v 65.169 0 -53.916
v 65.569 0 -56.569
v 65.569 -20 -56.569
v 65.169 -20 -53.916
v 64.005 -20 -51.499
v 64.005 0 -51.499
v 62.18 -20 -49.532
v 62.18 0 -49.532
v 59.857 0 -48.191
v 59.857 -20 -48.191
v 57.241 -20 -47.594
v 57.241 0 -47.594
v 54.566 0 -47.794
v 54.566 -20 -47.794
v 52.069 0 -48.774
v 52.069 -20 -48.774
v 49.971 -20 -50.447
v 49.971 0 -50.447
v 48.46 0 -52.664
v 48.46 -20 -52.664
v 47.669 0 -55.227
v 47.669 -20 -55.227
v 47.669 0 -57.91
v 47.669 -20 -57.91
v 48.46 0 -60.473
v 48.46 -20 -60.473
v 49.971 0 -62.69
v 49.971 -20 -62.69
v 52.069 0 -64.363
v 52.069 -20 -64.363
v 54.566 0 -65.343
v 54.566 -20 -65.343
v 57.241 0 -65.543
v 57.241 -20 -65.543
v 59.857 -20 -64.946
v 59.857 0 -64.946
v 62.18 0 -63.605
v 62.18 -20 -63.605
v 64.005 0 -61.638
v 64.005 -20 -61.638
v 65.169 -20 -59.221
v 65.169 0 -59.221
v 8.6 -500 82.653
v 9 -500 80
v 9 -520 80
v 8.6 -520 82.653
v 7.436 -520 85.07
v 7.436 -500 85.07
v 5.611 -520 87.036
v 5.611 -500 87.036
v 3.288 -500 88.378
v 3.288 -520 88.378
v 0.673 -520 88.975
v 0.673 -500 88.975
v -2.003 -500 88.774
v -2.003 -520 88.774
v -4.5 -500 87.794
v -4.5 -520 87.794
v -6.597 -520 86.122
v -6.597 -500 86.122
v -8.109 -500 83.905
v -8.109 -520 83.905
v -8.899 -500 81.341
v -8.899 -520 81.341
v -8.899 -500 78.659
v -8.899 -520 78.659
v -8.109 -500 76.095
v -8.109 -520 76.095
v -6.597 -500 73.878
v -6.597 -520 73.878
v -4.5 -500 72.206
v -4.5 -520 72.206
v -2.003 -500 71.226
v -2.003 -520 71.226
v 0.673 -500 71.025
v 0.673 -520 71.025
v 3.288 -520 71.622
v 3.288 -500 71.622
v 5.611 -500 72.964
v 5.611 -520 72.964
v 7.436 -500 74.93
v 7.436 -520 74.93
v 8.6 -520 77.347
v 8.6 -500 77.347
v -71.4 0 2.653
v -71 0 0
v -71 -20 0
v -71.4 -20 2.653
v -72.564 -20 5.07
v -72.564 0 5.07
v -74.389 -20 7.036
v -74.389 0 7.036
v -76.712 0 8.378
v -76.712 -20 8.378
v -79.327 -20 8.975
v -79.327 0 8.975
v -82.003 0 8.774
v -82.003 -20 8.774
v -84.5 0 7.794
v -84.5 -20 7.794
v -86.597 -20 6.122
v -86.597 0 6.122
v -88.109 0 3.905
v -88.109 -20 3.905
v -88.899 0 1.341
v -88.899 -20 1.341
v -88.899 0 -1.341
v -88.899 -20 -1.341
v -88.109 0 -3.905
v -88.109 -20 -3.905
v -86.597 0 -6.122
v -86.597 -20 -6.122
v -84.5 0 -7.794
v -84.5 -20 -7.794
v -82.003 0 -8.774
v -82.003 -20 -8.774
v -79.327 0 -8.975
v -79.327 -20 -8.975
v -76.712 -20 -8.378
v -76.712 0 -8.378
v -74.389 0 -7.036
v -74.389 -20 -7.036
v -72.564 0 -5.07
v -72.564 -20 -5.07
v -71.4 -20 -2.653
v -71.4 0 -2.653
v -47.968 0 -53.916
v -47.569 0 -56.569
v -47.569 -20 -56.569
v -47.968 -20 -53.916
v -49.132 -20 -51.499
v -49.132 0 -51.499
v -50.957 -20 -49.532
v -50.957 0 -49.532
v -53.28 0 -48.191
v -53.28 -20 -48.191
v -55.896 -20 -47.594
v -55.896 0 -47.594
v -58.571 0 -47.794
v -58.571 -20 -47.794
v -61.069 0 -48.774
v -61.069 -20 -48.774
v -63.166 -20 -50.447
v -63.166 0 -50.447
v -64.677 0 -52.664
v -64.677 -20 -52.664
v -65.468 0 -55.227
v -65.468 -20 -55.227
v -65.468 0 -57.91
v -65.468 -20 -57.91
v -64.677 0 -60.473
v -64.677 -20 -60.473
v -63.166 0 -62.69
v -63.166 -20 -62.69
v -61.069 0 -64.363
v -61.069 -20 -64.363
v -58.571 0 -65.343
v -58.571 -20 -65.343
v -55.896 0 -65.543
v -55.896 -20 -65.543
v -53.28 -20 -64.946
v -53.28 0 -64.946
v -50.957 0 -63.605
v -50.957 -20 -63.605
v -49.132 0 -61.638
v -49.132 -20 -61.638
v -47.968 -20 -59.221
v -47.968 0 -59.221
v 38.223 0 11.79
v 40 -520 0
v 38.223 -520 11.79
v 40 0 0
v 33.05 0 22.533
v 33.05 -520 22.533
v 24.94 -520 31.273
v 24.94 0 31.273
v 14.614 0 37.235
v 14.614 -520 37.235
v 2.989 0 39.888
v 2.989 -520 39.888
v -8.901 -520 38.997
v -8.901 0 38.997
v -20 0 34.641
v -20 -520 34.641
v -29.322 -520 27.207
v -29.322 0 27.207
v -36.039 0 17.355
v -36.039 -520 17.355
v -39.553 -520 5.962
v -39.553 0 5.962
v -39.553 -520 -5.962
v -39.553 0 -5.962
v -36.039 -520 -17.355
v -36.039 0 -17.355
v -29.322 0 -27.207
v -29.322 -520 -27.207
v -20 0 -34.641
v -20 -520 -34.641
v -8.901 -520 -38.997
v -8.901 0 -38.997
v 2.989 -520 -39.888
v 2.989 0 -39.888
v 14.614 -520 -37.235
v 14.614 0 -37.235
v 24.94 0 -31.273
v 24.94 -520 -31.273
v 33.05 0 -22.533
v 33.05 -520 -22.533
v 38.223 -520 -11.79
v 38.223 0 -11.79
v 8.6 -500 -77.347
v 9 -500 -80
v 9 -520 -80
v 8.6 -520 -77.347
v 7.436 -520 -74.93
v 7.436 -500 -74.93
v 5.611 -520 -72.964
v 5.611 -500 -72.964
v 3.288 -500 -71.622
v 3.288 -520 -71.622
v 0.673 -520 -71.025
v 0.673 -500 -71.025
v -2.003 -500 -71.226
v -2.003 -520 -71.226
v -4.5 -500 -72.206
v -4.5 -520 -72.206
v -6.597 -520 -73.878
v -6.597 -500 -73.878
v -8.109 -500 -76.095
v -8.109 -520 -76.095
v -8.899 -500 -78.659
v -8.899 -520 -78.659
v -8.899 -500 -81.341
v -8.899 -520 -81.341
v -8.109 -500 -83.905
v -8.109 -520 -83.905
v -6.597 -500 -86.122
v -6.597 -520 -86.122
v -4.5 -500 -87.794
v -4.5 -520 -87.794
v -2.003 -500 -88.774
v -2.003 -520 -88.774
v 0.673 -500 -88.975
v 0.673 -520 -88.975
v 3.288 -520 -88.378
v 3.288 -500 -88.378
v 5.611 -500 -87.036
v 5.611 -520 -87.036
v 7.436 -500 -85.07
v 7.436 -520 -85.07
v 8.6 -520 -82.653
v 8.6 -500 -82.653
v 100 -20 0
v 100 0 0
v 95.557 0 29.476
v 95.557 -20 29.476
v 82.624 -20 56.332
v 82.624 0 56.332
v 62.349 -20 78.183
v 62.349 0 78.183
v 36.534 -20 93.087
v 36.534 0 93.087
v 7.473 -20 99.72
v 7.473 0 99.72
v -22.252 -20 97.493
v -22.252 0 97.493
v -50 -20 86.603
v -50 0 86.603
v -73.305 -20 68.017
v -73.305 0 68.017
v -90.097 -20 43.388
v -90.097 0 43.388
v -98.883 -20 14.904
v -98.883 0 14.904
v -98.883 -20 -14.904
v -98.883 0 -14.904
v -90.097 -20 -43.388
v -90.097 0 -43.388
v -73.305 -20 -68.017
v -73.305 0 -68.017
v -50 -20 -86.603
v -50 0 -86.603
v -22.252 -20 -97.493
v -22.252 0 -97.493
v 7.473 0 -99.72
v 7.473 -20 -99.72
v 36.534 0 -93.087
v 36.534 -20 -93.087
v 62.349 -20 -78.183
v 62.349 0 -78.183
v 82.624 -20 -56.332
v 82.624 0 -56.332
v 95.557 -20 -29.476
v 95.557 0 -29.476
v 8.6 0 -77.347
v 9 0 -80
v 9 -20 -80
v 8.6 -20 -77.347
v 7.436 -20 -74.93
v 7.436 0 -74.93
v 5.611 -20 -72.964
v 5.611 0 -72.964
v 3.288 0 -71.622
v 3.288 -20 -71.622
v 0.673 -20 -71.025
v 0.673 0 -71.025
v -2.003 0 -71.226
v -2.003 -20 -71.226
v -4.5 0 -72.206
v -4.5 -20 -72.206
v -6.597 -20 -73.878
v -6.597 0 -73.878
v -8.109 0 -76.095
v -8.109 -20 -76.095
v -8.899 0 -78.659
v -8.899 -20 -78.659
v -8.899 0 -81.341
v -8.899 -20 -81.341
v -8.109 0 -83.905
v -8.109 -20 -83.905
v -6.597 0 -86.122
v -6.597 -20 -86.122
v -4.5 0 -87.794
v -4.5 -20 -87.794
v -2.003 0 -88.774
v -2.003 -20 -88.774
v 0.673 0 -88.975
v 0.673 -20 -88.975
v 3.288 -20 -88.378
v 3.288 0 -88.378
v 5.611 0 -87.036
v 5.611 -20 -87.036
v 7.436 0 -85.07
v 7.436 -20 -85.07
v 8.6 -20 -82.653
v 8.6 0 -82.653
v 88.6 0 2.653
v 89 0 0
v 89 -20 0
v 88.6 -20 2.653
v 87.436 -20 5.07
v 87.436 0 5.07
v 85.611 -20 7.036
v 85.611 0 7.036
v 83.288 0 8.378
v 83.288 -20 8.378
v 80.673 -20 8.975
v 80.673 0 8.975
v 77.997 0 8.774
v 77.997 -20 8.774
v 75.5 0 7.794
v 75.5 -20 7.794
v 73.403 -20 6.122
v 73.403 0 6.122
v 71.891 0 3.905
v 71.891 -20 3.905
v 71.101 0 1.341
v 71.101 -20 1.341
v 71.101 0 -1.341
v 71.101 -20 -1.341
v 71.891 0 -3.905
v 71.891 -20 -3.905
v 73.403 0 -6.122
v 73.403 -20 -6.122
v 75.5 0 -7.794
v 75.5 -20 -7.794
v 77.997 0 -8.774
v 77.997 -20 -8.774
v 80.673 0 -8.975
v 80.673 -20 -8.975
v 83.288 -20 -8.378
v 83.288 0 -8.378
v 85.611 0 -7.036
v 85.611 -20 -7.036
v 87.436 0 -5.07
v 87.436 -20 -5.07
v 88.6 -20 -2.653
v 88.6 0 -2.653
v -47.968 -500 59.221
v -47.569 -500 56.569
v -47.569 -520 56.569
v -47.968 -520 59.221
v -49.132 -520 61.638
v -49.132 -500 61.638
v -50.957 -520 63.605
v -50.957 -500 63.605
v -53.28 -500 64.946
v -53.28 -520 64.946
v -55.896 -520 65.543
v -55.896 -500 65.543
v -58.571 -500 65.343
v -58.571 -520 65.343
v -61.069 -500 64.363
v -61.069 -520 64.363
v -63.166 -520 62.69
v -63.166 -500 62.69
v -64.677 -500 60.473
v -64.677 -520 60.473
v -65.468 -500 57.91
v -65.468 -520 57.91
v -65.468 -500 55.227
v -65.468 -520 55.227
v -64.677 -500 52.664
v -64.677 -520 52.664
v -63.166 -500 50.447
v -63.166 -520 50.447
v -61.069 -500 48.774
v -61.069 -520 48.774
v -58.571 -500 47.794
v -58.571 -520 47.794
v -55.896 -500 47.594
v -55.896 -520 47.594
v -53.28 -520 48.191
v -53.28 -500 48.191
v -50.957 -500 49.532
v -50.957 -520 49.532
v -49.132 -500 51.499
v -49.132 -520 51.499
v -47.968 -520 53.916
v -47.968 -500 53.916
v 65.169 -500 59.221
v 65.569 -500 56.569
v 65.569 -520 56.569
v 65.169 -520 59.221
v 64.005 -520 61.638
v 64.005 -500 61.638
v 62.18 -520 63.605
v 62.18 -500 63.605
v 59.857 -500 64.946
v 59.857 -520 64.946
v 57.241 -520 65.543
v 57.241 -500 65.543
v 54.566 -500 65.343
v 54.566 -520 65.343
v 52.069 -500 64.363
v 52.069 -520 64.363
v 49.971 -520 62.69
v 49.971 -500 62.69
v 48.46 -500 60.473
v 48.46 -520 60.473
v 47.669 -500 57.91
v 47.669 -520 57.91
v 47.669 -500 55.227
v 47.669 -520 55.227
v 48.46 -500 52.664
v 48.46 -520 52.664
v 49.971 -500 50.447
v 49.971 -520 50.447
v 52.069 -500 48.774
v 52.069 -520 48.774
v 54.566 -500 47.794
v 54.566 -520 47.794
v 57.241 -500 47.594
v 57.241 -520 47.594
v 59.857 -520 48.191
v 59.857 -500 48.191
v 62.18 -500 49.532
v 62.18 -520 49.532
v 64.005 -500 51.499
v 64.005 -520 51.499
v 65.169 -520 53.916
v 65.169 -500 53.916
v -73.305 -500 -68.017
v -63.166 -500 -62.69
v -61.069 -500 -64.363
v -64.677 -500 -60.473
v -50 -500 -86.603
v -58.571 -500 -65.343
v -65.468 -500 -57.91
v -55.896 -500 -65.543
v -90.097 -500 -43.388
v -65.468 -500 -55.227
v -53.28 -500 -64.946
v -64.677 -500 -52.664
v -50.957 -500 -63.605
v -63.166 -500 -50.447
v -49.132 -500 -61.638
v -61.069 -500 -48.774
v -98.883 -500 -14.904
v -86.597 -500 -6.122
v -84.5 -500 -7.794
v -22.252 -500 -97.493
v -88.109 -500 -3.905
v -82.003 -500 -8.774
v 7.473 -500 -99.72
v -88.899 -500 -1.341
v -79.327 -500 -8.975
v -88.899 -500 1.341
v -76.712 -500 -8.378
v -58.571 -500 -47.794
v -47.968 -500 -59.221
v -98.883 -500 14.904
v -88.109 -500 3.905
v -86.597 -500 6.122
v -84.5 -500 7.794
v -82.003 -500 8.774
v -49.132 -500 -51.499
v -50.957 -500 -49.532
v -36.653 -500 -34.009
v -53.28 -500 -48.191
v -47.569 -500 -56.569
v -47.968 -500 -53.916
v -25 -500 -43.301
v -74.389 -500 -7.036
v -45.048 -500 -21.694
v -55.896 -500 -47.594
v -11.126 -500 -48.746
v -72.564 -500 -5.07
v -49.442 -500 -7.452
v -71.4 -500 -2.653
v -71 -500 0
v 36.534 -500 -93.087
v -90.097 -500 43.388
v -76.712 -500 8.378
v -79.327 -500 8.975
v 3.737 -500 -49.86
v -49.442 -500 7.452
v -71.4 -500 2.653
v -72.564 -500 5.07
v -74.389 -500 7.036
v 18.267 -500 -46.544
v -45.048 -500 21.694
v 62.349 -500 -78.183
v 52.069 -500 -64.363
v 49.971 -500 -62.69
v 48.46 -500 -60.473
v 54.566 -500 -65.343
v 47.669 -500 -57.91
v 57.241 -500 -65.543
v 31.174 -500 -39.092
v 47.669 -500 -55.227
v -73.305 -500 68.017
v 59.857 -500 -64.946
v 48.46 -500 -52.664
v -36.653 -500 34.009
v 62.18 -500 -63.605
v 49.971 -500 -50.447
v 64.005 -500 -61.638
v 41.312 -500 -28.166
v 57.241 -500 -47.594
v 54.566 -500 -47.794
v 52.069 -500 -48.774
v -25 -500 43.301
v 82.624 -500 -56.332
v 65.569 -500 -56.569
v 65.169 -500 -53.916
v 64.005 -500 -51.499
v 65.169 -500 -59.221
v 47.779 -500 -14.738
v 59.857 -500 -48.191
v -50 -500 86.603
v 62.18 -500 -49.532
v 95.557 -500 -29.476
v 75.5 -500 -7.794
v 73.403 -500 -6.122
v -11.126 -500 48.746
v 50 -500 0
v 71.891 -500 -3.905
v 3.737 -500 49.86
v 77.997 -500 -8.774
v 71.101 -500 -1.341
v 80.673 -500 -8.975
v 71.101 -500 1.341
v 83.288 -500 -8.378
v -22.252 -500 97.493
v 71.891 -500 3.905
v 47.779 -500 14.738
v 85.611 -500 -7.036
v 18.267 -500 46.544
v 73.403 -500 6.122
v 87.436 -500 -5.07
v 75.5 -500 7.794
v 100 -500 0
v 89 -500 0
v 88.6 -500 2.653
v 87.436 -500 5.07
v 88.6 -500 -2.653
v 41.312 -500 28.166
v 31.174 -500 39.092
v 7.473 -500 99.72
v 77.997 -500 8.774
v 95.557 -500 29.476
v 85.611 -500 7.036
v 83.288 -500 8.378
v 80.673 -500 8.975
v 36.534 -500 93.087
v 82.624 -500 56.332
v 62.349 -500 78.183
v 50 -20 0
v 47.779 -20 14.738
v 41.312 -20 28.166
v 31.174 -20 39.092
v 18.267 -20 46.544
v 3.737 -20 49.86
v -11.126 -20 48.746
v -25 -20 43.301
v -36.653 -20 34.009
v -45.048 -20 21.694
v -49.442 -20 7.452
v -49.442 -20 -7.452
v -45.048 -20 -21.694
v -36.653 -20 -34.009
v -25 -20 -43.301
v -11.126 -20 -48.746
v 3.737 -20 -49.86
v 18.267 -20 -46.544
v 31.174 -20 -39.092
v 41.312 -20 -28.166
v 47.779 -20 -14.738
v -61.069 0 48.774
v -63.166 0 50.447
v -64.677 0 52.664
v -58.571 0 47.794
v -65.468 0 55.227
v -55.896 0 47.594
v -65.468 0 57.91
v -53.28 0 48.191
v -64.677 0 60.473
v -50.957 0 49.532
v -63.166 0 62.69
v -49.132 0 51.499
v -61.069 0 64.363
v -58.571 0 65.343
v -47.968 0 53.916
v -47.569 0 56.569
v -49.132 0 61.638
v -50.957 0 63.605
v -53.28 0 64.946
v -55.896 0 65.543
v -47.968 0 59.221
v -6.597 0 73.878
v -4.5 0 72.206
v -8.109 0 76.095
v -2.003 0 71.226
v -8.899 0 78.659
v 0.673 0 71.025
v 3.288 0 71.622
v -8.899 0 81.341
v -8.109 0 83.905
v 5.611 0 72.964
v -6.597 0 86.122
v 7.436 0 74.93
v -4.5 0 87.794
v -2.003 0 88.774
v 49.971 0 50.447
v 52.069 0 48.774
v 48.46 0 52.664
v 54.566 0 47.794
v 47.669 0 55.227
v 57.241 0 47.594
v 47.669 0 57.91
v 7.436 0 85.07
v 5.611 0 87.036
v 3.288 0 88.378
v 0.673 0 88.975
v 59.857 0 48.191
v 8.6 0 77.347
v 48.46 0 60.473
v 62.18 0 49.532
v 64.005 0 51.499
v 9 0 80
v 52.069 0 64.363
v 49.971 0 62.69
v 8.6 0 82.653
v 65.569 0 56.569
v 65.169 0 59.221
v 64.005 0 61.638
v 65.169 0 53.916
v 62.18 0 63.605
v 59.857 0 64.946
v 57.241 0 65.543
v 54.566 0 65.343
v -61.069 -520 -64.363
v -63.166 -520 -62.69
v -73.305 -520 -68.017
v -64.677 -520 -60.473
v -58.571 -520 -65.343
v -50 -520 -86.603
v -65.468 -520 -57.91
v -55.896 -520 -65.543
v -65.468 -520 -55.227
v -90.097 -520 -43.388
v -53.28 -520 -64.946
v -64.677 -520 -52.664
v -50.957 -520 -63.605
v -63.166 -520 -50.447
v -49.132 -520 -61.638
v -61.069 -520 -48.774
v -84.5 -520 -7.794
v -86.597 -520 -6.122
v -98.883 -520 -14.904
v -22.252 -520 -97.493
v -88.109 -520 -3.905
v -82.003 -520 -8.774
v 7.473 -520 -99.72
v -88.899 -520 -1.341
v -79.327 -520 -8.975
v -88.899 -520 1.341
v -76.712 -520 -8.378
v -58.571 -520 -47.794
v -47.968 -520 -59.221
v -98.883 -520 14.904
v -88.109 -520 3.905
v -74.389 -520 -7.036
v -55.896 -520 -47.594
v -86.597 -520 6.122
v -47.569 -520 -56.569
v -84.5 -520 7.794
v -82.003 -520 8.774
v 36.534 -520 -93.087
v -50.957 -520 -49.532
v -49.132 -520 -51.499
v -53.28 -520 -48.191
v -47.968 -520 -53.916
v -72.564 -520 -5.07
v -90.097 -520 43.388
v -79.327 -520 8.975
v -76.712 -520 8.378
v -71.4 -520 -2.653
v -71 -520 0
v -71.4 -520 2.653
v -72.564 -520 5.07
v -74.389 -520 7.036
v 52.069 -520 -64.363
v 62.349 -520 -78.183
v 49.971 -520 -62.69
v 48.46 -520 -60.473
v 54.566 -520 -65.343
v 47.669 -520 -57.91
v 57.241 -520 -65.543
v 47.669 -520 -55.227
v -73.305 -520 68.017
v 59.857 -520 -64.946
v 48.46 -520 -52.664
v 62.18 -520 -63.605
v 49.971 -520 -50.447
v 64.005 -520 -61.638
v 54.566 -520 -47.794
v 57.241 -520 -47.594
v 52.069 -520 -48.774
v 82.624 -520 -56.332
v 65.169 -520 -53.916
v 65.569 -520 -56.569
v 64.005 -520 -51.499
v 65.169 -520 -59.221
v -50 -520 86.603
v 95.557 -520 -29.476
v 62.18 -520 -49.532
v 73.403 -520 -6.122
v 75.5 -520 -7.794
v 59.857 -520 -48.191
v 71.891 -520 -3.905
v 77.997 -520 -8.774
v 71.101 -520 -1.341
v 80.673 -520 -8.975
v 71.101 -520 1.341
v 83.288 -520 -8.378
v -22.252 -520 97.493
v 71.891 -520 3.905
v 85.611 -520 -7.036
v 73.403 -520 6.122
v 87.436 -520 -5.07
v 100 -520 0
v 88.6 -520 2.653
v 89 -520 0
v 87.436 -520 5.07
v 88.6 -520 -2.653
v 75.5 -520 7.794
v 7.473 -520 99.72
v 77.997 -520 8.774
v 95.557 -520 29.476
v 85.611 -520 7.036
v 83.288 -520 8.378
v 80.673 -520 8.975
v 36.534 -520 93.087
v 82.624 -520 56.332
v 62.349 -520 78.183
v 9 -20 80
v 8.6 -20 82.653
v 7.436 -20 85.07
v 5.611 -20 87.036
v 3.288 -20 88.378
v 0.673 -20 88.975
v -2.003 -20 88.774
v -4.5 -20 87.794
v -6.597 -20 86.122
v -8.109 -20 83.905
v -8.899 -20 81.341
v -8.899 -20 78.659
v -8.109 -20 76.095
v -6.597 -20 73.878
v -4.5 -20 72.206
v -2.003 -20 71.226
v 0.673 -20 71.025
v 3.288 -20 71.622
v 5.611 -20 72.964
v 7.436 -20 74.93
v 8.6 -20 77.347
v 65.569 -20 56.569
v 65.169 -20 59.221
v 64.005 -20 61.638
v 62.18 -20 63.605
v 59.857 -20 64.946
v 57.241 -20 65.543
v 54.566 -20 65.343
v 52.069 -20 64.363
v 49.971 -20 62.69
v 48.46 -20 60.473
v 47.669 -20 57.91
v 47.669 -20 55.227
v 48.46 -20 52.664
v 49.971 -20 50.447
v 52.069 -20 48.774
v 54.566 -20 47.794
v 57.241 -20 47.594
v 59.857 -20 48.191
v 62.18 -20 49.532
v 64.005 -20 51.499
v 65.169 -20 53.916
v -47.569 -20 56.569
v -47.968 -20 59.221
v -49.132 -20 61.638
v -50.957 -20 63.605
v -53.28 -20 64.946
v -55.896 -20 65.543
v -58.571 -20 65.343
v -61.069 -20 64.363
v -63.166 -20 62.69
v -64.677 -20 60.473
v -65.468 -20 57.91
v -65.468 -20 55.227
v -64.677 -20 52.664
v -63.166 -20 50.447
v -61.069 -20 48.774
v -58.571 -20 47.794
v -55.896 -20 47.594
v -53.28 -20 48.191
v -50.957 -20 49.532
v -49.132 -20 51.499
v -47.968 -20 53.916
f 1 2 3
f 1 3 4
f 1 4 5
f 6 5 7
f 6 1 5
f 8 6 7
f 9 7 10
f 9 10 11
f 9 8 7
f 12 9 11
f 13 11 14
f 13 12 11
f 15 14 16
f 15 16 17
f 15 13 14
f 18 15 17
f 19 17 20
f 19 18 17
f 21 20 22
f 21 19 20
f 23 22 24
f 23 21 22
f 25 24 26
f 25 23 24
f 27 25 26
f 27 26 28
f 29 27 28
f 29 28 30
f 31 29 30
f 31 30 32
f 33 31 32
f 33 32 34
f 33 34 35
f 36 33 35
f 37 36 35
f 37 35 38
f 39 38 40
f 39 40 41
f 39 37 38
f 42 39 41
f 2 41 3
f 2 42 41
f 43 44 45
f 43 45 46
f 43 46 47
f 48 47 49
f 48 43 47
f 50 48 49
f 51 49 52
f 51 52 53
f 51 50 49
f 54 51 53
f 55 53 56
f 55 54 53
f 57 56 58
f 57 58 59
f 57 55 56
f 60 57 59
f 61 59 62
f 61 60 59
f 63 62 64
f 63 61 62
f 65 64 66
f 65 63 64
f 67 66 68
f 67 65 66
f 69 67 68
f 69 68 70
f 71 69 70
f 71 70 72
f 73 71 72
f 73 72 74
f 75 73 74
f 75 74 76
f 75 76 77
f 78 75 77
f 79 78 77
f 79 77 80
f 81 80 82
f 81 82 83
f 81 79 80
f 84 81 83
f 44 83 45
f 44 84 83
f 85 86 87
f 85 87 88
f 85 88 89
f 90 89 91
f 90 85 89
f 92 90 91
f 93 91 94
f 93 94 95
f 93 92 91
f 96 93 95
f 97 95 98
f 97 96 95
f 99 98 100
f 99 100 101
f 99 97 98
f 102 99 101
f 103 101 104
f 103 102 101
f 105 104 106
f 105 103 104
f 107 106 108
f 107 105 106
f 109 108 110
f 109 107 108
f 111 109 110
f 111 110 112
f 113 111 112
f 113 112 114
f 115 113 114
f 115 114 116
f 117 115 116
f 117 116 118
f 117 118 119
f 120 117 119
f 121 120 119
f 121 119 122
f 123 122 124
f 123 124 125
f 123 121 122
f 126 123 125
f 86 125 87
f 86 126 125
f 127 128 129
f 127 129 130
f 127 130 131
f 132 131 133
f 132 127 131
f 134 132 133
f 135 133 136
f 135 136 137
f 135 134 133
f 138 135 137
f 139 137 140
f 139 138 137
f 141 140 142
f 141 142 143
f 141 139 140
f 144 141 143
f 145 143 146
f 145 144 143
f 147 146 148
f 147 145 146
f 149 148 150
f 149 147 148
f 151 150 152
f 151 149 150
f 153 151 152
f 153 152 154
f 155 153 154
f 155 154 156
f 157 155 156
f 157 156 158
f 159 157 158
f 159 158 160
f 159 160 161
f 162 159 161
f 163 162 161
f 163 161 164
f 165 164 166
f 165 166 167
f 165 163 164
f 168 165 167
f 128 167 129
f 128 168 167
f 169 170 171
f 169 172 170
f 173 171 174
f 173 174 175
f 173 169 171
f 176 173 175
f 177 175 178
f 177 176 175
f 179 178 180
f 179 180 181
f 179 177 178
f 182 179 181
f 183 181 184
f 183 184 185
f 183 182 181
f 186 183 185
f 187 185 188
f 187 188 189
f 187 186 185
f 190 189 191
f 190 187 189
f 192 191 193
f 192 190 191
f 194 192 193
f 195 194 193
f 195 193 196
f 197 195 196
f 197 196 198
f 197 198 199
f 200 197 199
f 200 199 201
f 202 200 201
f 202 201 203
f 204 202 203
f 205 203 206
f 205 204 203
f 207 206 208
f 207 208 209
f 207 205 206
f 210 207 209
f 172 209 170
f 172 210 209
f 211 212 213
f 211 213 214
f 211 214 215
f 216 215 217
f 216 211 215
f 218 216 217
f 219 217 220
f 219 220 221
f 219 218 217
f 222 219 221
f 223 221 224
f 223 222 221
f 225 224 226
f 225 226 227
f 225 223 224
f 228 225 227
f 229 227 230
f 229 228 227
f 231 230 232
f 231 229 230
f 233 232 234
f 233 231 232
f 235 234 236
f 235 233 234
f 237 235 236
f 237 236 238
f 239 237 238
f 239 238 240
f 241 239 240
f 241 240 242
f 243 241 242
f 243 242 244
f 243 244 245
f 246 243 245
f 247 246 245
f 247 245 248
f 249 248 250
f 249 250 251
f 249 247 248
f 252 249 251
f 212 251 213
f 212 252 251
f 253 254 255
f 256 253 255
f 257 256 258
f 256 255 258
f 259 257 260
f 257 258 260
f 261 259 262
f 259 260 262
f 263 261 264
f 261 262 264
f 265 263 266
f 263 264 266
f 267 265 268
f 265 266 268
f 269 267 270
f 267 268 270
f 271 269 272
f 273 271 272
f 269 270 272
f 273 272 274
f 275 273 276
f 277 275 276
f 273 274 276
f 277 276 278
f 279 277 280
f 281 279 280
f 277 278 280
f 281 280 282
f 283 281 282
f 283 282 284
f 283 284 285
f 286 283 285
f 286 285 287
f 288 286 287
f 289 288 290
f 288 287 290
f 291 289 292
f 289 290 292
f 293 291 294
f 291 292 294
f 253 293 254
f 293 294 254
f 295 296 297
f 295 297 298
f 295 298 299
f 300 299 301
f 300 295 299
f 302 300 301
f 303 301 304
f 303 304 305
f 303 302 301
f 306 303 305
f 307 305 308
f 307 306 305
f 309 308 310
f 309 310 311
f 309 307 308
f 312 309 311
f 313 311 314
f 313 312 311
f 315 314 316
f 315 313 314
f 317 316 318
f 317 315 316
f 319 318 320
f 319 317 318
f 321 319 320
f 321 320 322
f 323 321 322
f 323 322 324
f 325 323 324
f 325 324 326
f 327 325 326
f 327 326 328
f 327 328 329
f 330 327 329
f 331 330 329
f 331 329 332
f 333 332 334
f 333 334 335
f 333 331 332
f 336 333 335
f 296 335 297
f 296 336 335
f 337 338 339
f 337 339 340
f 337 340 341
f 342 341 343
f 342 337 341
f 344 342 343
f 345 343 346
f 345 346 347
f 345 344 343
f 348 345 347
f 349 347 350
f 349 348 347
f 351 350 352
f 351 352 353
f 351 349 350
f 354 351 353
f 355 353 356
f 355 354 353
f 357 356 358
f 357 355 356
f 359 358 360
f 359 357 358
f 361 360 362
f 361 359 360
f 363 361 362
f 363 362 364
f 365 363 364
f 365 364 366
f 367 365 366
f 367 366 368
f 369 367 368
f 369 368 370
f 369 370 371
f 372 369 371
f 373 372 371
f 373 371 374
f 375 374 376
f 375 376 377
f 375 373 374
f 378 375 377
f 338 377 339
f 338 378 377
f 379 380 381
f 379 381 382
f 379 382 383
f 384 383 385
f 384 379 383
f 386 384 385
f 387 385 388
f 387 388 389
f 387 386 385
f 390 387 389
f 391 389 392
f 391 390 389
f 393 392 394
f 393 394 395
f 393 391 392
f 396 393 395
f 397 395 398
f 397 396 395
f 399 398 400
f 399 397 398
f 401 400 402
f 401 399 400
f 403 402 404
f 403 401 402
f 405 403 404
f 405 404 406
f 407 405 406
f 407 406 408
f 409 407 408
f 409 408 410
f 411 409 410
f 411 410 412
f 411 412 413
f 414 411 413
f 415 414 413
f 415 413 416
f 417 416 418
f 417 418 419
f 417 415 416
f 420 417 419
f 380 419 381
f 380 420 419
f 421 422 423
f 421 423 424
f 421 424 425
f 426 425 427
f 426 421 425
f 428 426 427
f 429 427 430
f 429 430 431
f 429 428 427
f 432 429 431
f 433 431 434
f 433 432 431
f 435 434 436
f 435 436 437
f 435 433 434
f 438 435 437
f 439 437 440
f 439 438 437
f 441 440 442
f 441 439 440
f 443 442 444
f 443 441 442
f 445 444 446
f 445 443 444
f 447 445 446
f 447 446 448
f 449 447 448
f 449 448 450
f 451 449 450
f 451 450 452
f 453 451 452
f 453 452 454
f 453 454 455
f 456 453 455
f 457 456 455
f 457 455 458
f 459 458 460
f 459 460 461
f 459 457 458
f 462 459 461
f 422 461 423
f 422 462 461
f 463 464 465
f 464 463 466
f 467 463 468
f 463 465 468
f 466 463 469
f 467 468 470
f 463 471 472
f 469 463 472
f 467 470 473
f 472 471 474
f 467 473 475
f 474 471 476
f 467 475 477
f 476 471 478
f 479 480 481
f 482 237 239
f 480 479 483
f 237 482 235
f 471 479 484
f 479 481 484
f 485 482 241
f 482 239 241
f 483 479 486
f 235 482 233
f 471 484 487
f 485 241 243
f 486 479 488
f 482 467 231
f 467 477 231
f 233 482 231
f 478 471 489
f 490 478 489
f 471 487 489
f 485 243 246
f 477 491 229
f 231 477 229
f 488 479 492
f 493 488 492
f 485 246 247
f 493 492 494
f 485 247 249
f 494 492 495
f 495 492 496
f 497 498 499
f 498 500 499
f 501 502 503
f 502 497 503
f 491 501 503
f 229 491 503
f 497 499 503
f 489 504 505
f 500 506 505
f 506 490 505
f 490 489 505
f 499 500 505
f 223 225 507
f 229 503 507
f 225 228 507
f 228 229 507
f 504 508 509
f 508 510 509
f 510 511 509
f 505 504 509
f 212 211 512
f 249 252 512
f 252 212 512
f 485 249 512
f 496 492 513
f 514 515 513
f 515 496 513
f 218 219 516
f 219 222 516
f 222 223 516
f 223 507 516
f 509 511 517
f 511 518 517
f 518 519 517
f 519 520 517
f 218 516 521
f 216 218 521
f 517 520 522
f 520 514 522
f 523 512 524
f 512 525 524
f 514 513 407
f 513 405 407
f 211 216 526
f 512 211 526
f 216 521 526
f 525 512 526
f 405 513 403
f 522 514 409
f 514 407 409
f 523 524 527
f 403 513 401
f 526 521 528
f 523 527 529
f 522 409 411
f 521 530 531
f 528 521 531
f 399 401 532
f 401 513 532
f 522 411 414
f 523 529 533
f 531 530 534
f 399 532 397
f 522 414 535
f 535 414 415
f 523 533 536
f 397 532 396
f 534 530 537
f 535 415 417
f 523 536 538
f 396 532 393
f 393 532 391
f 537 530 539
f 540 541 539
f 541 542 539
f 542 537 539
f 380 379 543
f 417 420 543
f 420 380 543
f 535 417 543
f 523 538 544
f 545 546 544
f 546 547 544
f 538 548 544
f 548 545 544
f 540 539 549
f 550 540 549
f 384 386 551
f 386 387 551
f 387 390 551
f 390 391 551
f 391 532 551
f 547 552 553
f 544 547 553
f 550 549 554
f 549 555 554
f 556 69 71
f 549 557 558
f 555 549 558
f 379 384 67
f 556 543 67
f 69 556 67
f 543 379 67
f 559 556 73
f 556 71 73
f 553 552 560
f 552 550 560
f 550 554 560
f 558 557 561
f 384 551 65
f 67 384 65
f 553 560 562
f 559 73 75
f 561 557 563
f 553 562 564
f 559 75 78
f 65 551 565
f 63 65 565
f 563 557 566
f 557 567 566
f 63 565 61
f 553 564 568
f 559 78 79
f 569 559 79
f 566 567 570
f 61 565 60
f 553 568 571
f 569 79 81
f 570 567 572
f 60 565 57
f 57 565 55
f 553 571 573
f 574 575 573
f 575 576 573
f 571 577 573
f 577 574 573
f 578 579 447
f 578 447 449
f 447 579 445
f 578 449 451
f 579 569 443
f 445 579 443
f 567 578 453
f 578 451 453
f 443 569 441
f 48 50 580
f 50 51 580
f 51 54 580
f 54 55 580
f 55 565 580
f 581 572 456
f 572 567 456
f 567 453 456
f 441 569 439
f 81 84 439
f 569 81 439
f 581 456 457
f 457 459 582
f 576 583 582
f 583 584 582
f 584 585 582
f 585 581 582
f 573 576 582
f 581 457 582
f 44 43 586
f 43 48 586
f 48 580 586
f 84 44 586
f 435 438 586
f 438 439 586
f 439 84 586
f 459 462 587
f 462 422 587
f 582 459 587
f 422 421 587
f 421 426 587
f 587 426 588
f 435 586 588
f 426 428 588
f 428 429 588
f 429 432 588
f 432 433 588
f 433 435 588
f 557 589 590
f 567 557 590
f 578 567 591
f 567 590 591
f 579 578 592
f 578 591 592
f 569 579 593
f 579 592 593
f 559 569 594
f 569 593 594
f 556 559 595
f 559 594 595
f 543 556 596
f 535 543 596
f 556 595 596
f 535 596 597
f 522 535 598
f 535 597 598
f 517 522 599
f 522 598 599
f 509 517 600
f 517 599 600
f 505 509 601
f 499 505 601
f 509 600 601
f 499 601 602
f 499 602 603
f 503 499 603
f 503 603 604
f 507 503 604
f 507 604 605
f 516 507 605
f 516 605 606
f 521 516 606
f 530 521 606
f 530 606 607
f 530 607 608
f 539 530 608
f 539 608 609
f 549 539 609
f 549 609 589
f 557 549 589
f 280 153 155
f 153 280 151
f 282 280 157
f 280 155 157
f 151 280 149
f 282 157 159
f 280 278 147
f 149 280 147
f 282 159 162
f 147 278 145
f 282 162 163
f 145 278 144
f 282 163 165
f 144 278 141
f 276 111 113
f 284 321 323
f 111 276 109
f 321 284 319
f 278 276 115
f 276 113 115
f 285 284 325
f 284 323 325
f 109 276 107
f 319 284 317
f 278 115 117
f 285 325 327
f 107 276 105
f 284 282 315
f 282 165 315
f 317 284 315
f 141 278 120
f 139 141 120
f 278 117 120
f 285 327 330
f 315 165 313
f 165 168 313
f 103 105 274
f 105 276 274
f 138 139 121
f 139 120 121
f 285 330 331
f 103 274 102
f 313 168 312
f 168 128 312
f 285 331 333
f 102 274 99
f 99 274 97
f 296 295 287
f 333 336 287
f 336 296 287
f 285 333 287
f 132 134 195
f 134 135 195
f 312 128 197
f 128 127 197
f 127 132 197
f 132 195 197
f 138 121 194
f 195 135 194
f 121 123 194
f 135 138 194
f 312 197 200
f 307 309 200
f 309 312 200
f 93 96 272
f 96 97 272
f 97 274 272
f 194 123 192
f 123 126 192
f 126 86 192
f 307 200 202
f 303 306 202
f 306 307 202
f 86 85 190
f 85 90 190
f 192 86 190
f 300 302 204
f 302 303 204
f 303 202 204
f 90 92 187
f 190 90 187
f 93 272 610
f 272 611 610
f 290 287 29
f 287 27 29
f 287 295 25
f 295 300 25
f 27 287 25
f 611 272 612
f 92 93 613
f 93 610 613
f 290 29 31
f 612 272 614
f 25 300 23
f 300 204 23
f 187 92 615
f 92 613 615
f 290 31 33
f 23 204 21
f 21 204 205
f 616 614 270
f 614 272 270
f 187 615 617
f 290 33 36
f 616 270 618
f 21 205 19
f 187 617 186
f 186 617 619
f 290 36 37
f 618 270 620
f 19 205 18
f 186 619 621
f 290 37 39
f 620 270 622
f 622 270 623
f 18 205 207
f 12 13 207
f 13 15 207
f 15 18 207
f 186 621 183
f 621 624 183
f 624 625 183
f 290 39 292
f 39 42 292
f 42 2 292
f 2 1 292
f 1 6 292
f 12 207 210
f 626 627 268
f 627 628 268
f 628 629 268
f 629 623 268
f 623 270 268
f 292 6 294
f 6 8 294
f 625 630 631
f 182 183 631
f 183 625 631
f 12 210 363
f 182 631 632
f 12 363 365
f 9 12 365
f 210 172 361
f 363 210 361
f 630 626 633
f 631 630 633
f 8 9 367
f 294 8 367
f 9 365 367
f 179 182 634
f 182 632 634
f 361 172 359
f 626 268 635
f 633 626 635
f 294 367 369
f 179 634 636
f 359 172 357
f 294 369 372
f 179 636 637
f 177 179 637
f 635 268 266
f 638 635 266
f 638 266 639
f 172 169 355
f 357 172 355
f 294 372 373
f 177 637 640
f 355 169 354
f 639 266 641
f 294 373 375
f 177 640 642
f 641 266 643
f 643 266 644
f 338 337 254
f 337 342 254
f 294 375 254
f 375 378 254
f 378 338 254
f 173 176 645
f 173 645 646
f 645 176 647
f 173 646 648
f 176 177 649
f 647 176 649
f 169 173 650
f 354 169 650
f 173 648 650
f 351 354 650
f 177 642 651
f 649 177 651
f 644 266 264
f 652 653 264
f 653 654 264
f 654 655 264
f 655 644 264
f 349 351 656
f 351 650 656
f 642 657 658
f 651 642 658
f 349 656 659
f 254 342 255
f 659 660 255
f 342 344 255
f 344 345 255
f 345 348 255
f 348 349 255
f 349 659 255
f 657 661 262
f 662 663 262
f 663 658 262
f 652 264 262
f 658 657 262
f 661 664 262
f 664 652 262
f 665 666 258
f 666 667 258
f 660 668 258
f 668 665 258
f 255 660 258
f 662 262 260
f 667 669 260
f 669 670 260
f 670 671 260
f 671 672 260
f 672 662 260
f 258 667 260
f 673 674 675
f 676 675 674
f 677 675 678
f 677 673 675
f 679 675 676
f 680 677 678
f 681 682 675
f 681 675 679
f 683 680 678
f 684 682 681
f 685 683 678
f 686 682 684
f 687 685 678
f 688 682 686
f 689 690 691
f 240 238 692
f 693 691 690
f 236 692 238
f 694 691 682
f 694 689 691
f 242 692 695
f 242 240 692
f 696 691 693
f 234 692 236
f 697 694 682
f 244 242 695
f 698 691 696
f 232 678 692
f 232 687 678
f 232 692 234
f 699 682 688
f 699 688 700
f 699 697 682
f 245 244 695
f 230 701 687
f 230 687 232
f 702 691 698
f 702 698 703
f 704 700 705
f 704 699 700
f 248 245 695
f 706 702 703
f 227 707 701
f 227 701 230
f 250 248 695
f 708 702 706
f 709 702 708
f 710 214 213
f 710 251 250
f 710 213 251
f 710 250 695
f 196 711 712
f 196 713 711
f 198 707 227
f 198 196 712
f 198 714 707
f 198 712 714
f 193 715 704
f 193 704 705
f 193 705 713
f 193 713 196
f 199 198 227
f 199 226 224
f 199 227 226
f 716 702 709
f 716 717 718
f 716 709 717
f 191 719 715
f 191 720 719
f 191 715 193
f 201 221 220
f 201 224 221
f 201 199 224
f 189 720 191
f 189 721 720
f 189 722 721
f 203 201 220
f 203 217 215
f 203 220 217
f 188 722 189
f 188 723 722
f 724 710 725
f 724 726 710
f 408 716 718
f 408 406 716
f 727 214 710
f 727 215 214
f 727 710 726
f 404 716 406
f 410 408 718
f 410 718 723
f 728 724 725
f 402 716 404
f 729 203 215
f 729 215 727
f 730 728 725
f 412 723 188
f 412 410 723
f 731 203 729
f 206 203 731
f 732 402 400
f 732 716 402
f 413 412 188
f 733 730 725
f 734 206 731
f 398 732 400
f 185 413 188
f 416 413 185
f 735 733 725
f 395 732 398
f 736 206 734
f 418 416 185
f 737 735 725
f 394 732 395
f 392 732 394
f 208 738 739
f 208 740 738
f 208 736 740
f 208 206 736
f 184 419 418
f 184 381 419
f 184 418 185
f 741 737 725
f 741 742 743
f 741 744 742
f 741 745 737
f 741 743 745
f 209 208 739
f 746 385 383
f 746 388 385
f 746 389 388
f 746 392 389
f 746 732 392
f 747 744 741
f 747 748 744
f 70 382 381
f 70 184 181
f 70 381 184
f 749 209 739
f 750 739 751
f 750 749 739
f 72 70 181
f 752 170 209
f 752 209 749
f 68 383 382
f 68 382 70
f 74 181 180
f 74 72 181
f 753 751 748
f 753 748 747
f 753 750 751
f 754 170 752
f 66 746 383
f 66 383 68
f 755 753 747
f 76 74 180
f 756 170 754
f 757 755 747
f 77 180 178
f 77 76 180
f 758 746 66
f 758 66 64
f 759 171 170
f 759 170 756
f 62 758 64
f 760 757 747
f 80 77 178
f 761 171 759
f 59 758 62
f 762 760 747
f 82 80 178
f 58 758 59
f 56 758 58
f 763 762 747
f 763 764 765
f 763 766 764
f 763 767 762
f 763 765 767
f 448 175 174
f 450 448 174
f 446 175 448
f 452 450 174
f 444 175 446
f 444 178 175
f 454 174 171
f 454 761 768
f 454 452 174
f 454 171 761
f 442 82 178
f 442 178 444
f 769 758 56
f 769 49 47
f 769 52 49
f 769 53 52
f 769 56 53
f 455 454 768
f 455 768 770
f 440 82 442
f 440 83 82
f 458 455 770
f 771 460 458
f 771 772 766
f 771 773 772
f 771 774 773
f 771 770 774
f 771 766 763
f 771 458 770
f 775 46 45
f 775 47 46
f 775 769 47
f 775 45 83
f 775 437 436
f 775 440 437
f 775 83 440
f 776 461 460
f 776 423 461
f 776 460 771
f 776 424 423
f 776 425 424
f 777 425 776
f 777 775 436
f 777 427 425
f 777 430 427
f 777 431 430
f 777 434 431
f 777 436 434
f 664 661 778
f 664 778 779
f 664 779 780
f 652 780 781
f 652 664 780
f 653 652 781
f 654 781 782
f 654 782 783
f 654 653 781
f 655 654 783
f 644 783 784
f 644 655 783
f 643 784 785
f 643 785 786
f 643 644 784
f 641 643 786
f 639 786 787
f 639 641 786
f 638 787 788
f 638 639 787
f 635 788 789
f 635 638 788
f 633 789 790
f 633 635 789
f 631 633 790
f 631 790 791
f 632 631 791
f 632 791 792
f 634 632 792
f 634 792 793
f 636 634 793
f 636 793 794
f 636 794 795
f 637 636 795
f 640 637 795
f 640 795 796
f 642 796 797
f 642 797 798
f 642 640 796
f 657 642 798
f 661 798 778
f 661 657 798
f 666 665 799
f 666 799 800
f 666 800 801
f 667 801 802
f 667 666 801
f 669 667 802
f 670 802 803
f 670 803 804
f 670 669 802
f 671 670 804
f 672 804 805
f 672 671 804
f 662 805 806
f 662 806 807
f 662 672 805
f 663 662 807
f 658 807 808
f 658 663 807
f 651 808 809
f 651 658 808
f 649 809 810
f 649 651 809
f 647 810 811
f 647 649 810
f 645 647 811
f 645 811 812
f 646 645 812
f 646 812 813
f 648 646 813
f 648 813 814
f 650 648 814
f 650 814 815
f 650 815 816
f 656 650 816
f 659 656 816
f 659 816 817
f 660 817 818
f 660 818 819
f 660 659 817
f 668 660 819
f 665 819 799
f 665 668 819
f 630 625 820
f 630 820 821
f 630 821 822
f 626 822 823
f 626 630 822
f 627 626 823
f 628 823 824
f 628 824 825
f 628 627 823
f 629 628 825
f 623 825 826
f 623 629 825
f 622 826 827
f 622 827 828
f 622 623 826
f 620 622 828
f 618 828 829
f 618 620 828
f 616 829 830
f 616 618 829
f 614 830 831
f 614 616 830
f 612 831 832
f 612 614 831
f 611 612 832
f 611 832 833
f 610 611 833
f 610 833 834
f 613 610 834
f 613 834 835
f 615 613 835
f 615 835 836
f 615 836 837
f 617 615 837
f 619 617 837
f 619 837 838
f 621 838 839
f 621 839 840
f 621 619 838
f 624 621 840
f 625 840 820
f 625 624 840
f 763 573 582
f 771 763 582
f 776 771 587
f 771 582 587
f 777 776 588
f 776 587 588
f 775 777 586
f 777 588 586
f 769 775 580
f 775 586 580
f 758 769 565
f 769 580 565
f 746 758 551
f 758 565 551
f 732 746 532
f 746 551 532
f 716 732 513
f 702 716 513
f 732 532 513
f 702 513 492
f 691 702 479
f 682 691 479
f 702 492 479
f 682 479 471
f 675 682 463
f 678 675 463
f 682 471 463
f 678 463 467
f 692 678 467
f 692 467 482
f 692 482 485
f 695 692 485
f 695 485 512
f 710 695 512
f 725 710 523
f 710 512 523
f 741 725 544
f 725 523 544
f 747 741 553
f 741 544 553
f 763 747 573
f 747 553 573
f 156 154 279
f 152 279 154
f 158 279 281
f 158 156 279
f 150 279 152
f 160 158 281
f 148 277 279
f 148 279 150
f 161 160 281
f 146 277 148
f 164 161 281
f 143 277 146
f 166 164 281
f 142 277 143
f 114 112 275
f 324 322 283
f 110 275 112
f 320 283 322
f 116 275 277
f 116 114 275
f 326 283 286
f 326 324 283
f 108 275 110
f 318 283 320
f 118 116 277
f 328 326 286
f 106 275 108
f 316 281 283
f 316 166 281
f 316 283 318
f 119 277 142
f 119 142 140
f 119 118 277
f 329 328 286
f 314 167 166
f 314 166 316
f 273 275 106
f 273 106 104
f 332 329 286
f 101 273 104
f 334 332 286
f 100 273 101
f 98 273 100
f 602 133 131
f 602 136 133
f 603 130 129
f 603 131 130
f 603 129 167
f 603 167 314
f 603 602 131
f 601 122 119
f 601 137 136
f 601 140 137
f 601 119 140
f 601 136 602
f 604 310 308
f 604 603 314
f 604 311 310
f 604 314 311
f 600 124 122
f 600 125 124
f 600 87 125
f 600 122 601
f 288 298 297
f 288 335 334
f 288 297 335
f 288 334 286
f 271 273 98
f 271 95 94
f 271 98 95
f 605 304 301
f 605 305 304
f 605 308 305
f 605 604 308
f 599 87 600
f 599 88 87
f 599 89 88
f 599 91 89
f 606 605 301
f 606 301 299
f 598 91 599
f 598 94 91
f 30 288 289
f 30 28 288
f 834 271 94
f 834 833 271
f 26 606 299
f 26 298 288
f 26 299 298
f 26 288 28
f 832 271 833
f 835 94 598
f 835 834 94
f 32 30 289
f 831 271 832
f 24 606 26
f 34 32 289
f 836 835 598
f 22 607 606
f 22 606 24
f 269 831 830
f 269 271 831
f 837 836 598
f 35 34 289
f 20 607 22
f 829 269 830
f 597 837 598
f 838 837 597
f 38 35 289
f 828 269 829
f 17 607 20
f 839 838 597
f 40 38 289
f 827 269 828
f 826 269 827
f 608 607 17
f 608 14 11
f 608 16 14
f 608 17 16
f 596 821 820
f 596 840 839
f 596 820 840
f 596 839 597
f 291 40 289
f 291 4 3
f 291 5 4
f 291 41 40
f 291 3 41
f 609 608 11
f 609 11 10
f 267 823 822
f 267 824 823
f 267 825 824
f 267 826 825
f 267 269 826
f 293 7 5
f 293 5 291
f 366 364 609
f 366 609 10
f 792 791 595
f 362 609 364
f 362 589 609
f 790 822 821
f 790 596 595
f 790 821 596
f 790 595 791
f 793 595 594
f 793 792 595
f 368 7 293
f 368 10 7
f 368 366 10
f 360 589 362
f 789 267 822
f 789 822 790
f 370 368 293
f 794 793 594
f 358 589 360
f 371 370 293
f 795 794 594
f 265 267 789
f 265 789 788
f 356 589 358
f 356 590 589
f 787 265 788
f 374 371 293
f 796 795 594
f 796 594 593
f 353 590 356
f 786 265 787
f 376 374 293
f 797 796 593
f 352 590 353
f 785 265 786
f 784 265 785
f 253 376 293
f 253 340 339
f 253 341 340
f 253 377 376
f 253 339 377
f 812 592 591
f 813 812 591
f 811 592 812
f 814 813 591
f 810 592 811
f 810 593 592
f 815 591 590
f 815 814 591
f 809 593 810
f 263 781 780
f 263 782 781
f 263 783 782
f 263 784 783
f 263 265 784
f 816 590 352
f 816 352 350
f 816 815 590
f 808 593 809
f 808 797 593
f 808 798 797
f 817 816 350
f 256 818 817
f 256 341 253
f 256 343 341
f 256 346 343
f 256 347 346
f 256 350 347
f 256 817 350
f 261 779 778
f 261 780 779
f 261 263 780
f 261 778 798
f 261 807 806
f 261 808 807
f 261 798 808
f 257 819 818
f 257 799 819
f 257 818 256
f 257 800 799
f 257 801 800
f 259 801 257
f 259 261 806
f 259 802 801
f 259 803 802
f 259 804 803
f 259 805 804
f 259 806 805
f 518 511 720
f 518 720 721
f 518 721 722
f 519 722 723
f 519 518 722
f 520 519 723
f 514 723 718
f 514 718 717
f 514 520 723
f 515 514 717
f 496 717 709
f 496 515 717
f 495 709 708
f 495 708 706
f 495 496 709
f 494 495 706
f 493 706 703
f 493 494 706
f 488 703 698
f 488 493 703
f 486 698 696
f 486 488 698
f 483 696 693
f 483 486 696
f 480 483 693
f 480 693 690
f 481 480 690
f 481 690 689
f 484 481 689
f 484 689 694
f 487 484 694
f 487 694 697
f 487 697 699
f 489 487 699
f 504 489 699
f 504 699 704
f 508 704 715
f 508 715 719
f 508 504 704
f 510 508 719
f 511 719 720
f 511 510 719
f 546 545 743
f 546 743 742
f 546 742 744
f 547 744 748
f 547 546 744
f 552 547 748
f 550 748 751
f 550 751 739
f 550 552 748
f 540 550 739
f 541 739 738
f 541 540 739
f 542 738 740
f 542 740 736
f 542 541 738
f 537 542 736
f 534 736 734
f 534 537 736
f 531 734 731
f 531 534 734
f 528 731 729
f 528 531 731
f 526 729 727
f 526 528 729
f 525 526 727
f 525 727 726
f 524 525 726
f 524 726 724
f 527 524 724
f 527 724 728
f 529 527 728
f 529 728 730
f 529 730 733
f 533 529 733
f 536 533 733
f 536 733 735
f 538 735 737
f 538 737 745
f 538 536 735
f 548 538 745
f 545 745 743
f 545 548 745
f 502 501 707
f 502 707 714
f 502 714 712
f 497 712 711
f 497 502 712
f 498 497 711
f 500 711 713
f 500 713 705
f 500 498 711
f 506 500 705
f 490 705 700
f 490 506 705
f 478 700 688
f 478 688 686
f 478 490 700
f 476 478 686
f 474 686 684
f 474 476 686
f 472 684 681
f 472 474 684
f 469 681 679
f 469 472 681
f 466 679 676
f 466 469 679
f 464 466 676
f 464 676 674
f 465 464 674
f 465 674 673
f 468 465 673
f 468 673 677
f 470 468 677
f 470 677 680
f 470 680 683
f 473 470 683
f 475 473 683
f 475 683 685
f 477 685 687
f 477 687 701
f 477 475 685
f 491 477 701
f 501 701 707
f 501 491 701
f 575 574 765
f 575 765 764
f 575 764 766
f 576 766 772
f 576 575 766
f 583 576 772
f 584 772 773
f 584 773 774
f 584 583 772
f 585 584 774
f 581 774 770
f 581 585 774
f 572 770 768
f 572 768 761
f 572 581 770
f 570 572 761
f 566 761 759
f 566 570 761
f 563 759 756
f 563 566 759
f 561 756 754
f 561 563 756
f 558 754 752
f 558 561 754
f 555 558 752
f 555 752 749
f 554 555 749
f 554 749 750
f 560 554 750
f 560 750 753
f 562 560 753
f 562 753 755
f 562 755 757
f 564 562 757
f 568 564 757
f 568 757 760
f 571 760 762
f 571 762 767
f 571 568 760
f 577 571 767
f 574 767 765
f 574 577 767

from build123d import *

# Parameters (mm, degrees)
F0_R     = 100
F0_R_2   = 9
F0_R_3   = 50
F0_R_4   = 40
F1_DEPTH = 20
F2_DEPTH = 500
F3_R     = 100
F3_R_2   = 9
F3_R_3   = 50
F3_R_4   = 40
F4_DEPTH = 20


with BuildPart() as f1:
    # F0 (on Front) → F1 (new body)
    with BuildSketch(Plane.XZ):
        Circle(F0_R)
        with Locations((-56.5685424949, -56.5685424949)):
            Circle(F0_R_2, mode=Mode.SUBTRACT)
        with Locations((0, -80)):
            Circle(F0_R_2, mode=Mode.SUBTRACT)
        with Locations((56.5685424949, -56.5685424949)):
            Circle(F0_R_2, mode=Mode.SUBTRACT)
        with Locations((-80, 0)):
            Circle(F0_R_2, mode=Mode.SUBTRACT)
        with Locations((-56.5685424949, 56.5685424949)):
            Circle(F0_R_2, mode=Mode.SUBTRACT)
        Circle(F0_R_3, mode=Mode.SUBTRACT)
        with Locations((80, 0)):
            Circle(F0_R_2, mode=Mode.SUBTRACT)
        with Locations((0, 80)):
            Circle(F0_R_2, mode=Mode.SUBTRACT)
        with Locations((56.5685424949, 56.5685424949)):
            Circle(F0_R_2, mode=Mode.SUBTRACT)
        Circle(F0_R_3)
        Circle(F0_R_4, mode=Mode.SUBTRACT)
    extrude(amount=F1_DEPTH)

    # F0 (on Front) → F2 (join)
    with BuildSketch(Plane.XZ):
        Circle(F0_R_3)
        Circle(F0_R_4, mode=Mode.SUBTRACT)
    extrude(amount=F2_DEPTH)

    # F3 (on face) → F4 (join)
    with BuildSketch(Plane.XZ.offset(500)):
        Circle(F3_R)
        with Locations((-56.5685424949, -56.5685424949)):
            Circle(F3_R_2, mode=Mode.SUBTRACT)
        with Locations((0, -80)):
            Circle(F3_R_2, mode=Mode.SUBTRACT)
        with Locations((56.5685424949, -56.5685424949)):
            Circle(F3_R_2, mode=Mode.SUBTRACT)
        with Locations((-80, 0)):
            Circle(F3_R_2, mode=Mode.SUBTRACT)
        with Locations((-56.5685424949, 56.5685424949)):
            Circle(F3_R_2, mode=Mode.SUBTRACT)
        Circle(F3_R_3, mode=Mode.SUBTRACT)
        with Locations((80, 0)):
            Circle(F3_R_2, mode=Mode.SUBTRACT)
        with Locations((0, 80)):
            Circle(F3_R_2, mode=Mode.SUBTRACT)
        with Locations((56.5685424949, 56.5685424949)):
            Circle(F3_R_2, mode=Mode.SUBTRACT)
        Circle(F3_R_3)
        Circle(F3_R_4, mode=Mode.SUBTRACT)
    extrude(amount=F4_DEPTH)


solid = f1.part
